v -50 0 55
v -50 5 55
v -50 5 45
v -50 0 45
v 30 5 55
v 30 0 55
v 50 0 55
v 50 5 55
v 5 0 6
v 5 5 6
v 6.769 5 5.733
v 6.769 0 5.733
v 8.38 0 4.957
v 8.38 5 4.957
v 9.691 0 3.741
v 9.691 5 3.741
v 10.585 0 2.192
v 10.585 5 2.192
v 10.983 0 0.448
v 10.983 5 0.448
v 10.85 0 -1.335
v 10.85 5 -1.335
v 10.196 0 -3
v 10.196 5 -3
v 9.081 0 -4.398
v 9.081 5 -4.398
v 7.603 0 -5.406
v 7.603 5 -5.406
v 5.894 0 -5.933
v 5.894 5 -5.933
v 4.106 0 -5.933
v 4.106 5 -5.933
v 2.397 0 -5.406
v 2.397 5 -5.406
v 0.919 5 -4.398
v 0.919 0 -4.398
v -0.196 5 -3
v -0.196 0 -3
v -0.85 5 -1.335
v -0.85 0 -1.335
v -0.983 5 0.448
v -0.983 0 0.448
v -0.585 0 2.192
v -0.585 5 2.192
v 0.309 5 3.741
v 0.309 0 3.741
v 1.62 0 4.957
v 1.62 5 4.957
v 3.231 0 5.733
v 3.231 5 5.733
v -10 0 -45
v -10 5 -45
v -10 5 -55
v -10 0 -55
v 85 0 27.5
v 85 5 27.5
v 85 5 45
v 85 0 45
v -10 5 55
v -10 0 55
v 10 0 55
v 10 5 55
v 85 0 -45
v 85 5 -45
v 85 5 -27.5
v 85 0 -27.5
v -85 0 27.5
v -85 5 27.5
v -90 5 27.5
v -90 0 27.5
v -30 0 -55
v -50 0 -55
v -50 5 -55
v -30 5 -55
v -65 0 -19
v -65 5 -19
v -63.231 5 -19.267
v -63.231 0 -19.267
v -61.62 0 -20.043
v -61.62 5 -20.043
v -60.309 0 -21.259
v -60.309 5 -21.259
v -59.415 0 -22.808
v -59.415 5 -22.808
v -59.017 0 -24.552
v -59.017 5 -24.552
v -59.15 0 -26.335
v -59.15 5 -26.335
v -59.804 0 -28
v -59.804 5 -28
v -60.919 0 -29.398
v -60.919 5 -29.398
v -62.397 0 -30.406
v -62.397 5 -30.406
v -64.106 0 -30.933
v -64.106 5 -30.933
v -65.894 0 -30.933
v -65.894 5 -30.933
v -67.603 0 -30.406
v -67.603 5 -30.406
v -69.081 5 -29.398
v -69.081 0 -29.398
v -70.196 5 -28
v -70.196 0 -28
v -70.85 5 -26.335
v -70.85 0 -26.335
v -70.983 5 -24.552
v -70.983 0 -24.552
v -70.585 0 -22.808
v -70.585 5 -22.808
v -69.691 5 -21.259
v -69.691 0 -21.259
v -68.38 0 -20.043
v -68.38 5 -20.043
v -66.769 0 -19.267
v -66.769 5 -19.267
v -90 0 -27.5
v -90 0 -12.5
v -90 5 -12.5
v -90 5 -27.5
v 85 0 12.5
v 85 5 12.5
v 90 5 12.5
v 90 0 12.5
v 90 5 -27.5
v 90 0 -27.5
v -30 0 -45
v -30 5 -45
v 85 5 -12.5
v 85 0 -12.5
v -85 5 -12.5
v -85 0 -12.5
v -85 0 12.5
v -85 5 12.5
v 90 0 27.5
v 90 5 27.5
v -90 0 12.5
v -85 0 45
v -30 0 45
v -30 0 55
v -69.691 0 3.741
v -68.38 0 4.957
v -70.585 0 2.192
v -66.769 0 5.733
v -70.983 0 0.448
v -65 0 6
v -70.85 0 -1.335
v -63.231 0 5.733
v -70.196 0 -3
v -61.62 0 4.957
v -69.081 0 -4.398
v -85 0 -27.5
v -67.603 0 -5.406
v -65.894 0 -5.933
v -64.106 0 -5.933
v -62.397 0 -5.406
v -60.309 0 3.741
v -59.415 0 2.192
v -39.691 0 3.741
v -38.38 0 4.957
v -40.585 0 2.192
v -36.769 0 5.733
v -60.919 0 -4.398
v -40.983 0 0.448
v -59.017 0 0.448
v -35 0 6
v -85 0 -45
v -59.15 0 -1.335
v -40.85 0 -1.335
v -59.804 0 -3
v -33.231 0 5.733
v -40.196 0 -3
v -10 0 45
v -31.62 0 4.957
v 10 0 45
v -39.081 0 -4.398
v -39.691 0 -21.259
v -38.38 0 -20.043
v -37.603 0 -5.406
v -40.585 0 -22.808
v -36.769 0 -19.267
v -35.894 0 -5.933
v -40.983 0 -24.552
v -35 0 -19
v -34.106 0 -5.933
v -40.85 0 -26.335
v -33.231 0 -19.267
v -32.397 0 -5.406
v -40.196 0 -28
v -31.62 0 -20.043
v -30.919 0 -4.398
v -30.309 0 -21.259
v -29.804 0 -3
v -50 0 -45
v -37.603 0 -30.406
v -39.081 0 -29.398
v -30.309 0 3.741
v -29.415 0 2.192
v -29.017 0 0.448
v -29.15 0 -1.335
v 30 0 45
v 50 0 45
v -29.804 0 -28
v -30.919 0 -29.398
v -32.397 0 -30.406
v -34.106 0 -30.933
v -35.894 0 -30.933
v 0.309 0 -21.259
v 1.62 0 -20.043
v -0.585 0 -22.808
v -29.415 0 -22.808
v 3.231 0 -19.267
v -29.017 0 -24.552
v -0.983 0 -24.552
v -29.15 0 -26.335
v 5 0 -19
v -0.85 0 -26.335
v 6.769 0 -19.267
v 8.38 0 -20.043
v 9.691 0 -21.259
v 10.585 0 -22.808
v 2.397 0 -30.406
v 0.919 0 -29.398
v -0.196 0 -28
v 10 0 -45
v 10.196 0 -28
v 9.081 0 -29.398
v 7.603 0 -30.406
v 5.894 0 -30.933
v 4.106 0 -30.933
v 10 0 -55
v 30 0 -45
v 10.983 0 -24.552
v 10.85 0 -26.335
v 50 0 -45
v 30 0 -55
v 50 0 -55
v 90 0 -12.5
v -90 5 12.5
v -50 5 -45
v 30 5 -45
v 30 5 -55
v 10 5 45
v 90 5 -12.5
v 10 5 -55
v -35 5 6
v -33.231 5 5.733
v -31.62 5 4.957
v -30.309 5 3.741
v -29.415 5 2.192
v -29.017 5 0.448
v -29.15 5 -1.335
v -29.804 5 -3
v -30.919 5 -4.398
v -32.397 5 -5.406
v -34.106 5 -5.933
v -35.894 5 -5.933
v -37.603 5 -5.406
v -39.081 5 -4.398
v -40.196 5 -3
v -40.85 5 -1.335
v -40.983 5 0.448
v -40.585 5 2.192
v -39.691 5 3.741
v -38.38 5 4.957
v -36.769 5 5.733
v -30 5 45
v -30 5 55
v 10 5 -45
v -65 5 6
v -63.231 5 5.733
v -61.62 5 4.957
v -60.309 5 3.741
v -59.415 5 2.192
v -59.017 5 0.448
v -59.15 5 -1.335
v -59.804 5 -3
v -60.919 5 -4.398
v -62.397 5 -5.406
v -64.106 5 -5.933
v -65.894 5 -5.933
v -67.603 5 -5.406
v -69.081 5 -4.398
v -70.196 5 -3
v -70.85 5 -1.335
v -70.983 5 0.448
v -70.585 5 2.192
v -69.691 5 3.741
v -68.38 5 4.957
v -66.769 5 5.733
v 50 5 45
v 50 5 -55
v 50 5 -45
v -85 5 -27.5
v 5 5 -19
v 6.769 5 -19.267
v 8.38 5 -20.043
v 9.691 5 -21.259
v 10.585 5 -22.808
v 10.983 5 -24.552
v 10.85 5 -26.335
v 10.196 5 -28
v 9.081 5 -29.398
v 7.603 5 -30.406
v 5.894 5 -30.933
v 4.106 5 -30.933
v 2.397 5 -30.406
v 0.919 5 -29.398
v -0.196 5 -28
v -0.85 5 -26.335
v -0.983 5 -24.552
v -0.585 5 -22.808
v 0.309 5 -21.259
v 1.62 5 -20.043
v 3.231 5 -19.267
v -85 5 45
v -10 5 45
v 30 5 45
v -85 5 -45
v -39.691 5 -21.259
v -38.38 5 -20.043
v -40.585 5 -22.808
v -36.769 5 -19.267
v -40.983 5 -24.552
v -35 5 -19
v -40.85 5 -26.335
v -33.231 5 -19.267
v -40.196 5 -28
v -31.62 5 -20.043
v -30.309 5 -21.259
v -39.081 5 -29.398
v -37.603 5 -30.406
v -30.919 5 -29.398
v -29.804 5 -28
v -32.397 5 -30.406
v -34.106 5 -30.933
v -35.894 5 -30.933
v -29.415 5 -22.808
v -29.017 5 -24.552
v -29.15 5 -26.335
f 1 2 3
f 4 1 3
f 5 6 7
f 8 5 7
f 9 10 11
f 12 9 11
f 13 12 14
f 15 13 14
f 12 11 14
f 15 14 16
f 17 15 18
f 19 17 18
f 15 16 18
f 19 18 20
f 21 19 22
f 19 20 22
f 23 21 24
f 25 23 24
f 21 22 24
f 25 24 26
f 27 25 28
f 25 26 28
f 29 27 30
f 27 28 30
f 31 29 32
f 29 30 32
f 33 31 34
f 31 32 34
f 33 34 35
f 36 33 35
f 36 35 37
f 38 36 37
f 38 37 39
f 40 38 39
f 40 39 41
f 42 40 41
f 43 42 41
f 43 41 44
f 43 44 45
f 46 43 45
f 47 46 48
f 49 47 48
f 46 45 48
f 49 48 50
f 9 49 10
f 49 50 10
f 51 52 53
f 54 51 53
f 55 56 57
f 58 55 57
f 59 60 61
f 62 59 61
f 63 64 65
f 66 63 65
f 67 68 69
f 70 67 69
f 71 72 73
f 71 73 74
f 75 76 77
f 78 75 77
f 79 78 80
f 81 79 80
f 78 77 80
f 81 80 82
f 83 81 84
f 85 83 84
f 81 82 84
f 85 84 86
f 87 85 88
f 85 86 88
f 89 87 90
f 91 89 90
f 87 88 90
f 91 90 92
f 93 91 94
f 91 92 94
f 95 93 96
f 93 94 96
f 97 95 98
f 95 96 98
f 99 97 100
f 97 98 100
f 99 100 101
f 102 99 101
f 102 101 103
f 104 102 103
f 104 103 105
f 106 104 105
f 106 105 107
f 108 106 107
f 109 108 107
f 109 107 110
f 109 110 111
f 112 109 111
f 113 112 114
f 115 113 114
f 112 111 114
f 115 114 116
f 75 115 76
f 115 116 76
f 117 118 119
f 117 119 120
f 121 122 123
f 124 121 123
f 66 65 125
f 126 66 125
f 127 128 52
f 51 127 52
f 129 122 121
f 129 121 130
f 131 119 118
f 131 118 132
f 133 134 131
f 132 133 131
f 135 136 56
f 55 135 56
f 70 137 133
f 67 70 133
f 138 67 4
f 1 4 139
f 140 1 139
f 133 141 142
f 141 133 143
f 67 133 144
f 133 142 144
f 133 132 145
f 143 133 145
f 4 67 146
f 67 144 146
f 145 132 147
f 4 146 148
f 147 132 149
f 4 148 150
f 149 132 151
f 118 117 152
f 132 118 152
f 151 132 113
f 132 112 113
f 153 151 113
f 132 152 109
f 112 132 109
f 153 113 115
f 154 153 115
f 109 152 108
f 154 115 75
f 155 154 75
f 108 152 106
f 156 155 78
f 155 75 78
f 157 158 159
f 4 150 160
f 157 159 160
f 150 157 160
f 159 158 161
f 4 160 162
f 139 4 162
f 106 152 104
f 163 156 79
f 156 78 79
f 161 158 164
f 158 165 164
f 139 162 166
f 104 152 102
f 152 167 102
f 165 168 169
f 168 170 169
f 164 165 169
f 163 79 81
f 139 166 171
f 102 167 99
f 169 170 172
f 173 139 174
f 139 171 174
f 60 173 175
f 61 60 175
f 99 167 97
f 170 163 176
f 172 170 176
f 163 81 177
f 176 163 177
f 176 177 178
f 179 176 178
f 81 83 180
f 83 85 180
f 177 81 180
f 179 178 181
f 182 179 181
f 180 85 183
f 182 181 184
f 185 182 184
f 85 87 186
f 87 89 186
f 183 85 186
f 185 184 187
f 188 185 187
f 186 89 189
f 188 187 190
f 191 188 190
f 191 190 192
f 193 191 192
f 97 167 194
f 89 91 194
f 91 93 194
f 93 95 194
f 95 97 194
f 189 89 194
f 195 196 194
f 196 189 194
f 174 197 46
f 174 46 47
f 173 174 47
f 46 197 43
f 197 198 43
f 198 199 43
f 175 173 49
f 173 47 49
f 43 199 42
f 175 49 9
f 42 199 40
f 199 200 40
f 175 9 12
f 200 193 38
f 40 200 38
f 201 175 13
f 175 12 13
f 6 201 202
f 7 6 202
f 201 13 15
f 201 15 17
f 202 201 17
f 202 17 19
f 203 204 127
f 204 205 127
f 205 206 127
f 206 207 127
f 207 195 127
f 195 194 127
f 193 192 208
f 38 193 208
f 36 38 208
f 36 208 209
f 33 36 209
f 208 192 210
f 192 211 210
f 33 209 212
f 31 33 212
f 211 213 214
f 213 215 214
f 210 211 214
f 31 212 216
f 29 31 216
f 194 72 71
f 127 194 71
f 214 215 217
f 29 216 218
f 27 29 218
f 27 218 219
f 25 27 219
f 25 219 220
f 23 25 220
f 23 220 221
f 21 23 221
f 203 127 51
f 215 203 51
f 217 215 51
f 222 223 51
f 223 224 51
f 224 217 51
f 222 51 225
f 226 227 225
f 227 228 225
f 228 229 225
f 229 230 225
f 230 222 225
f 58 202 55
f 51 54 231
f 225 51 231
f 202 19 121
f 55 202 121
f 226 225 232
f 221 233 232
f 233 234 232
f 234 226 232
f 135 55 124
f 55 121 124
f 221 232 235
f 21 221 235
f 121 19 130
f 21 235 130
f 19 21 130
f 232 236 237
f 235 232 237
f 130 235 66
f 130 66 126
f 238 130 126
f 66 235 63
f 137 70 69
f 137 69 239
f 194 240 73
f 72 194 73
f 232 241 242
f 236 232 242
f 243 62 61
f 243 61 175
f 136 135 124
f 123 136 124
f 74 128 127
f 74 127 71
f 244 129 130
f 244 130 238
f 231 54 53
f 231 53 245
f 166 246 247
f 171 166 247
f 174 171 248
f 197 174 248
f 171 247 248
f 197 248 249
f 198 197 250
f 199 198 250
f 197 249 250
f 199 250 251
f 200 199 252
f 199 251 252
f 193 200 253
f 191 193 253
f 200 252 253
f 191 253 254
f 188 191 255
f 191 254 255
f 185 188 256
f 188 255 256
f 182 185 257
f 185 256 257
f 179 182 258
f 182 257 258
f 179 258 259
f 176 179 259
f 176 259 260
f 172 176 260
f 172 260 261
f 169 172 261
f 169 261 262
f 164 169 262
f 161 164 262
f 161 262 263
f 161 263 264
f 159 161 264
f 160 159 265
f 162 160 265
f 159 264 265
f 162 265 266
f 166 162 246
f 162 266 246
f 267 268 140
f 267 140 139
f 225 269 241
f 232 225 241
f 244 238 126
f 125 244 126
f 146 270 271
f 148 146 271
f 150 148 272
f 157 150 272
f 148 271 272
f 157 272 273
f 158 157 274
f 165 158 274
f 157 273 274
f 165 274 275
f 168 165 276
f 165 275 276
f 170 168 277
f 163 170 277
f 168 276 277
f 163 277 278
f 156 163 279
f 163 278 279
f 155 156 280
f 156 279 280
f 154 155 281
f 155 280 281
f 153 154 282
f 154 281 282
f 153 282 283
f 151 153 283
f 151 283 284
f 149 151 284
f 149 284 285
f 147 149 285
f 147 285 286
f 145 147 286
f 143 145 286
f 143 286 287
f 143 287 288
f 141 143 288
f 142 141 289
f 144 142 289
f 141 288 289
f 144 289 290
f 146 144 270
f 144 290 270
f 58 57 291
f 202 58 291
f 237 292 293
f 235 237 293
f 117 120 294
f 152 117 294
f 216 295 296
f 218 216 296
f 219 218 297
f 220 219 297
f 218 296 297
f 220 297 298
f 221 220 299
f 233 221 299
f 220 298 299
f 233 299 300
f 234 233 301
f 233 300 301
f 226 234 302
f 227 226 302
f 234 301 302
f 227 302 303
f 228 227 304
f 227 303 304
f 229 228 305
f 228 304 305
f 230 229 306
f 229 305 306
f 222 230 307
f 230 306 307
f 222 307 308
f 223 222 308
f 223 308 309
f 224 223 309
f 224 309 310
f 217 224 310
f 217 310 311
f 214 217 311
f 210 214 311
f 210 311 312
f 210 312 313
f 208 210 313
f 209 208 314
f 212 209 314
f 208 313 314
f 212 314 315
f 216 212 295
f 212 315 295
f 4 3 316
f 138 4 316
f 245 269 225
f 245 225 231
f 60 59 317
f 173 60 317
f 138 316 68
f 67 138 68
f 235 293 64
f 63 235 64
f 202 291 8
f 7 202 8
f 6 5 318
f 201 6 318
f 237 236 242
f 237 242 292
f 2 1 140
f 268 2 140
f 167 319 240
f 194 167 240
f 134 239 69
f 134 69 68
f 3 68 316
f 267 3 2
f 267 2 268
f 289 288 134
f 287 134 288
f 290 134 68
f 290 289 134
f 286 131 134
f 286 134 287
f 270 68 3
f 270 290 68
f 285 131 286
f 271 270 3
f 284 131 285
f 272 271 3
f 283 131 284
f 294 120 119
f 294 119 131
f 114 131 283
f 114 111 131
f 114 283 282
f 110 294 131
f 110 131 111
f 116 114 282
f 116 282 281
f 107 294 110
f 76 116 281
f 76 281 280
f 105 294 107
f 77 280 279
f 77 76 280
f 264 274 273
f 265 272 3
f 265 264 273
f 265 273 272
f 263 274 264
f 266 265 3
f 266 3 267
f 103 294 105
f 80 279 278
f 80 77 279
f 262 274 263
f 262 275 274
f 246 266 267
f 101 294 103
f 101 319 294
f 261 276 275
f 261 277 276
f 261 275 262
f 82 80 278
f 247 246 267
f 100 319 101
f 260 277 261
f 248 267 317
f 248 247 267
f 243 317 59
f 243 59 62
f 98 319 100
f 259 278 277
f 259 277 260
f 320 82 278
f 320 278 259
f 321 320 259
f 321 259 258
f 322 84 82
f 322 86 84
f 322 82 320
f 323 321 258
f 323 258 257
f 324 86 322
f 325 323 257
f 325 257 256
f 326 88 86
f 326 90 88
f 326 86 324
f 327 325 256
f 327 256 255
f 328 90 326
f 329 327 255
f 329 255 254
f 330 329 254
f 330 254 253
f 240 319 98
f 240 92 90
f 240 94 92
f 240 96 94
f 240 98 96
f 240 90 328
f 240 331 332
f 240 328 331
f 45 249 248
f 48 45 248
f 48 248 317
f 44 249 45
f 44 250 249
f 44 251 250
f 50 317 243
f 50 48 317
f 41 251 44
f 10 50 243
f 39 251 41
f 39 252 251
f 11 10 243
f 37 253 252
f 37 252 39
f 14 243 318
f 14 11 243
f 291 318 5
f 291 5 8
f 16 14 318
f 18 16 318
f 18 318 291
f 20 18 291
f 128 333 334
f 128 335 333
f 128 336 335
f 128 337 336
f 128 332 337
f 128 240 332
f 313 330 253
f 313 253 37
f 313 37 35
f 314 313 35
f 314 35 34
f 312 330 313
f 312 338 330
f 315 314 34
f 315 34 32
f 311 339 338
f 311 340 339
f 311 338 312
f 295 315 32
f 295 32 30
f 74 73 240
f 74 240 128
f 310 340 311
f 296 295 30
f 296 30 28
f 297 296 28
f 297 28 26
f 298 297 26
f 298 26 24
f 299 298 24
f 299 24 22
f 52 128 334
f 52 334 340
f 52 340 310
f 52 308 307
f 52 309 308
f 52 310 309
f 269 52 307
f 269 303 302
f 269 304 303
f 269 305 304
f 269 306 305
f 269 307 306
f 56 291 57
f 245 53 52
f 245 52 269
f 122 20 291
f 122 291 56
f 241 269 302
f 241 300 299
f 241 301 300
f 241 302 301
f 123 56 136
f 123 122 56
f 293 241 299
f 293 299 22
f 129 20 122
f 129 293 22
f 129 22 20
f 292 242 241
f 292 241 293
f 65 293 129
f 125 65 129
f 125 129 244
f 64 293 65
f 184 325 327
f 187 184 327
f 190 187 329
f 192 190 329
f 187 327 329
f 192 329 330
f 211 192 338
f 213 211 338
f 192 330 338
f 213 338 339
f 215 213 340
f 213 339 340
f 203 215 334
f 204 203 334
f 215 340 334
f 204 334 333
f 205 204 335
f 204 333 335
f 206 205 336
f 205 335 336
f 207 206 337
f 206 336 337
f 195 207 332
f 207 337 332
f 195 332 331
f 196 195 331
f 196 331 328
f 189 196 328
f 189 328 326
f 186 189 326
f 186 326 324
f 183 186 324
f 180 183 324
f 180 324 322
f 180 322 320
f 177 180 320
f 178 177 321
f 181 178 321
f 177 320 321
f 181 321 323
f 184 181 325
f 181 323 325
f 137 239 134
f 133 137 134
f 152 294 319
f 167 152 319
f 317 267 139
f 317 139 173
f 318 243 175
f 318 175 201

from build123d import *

# Parameters (mm, degrees)
ESQUISSE1_W             = 180
ESQUISSE1_H             = 110
BOSS_EXTRU_1_DEPTH      = 5
ESQUISSE2_W             = 20
ESQUISSE2_H             = 10
ESQUISSE2_W_2           = 5
ESQUISSE2_H_2           = 25
ENL_V_MAT_EXTRU_1_DEPTH = 5
ESQUISSE3_R             = 6
ENL_V_MAT_EXTRU_2_DEPTH = 5


with BuildPart() as part:
    # Esquisse1 → Boss.-Extru.1 (new body)
    with BuildSketch(Plane(origin=(0, 0, 0), x_dir=(1, 0, 0), z_dir=(0, 1, 0))):
        Rectangle(ESQUISSE1_W, ESQUISSE1_H)
    extrude(amount=BOSS_EXTRU_1_DEPTH)

    # Esquisse2 → Enlèv. mat.-Extru.1 (cut)
    with BuildSketch(Plane(origin=(0, 5, 0), x_dir=(1, 0, 0), z_dir=(0, 1, 0))):
        Polygon((-90, 55), (-90, 27.5), (-85, 27.5), (-85, 45), (-50, 45), (-50, 55), align=None)
        Polygon((85, 27.5), (90, 27.5), (90, 55), (50, 55), (50, 45), (85, 45), align=None)
        with Locations((20, 50)):
            Rectangle(ESQUISSE2_W, ESQUISSE2_H)
        with Locations((-20, 50)):
            Rectangle(ESQUISSE2_W, ESQUISSE2_H)
        with Locations((-87.5, 0)):
            Rectangle(ESQUISSE2_W_2, ESQUISSE2_H_2)
        Polygon((-90, -55), (-50, -55), (-50, -45), (-85, -45), (-85, -27.5), (-90, -27.5), align=None)
        Polygon((50, -45), (50, -55), (90, -55), (90, -27.5), (85, -27.5), (85, -45), align=None)
        with Locations((87.5, 0)):
            Rectangle(ESQUISSE2_W_2, ESQUISSE2_H_2)
        with Locations((20, -50)):
            Rectangle(ESQUISSE2_W, ESQUISSE2_H)
        with Locations((-20, -50)):
            Rectangle(ESQUISSE2_W, ESQUISSE2_H)
    extrude(amount=-ENL_V_MAT_EXTRU_1_DEPTH, mode=Mode.SUBTRACT)

    # Esquisse3 → Enlèv. mat.-Extru.2 (cut)
    with BuildSketch(Plane(origin=(0, 5, 0), x_dir=(1, 0, 0), z_dir=(0, 1, 0))):
        with Locations(Location((-35, 25, 0), (0, 0, 270))):
            Circle(ESQUISSE3_R)
        with Locations(Location((-35, 0, 0), (0, 0, 270))):
            Circle(ESQUISSE3_R)
        with Locations(Location((5, 25, 0), (0, 0, 270))):
            Circle(ESQUISSE3_R)
        with Locations(Location((5, 0, 0), (0, 0, 270))):
            Circle(ESQUISSE3_R)
        with Locations(Location((-65, 25, 0), (0, 0, 270))):
            Circle(ESQUISSE3_R)
        with Locations(Location((-65, 0, 0), (0, 0, 270))):
            Circle(ESQUISSE3_R)
    extrude(amount=-ENL_V_MAT_EXTRU_2_DEPTH, mode=Mode.SUBTRACT)


solid = part.part
